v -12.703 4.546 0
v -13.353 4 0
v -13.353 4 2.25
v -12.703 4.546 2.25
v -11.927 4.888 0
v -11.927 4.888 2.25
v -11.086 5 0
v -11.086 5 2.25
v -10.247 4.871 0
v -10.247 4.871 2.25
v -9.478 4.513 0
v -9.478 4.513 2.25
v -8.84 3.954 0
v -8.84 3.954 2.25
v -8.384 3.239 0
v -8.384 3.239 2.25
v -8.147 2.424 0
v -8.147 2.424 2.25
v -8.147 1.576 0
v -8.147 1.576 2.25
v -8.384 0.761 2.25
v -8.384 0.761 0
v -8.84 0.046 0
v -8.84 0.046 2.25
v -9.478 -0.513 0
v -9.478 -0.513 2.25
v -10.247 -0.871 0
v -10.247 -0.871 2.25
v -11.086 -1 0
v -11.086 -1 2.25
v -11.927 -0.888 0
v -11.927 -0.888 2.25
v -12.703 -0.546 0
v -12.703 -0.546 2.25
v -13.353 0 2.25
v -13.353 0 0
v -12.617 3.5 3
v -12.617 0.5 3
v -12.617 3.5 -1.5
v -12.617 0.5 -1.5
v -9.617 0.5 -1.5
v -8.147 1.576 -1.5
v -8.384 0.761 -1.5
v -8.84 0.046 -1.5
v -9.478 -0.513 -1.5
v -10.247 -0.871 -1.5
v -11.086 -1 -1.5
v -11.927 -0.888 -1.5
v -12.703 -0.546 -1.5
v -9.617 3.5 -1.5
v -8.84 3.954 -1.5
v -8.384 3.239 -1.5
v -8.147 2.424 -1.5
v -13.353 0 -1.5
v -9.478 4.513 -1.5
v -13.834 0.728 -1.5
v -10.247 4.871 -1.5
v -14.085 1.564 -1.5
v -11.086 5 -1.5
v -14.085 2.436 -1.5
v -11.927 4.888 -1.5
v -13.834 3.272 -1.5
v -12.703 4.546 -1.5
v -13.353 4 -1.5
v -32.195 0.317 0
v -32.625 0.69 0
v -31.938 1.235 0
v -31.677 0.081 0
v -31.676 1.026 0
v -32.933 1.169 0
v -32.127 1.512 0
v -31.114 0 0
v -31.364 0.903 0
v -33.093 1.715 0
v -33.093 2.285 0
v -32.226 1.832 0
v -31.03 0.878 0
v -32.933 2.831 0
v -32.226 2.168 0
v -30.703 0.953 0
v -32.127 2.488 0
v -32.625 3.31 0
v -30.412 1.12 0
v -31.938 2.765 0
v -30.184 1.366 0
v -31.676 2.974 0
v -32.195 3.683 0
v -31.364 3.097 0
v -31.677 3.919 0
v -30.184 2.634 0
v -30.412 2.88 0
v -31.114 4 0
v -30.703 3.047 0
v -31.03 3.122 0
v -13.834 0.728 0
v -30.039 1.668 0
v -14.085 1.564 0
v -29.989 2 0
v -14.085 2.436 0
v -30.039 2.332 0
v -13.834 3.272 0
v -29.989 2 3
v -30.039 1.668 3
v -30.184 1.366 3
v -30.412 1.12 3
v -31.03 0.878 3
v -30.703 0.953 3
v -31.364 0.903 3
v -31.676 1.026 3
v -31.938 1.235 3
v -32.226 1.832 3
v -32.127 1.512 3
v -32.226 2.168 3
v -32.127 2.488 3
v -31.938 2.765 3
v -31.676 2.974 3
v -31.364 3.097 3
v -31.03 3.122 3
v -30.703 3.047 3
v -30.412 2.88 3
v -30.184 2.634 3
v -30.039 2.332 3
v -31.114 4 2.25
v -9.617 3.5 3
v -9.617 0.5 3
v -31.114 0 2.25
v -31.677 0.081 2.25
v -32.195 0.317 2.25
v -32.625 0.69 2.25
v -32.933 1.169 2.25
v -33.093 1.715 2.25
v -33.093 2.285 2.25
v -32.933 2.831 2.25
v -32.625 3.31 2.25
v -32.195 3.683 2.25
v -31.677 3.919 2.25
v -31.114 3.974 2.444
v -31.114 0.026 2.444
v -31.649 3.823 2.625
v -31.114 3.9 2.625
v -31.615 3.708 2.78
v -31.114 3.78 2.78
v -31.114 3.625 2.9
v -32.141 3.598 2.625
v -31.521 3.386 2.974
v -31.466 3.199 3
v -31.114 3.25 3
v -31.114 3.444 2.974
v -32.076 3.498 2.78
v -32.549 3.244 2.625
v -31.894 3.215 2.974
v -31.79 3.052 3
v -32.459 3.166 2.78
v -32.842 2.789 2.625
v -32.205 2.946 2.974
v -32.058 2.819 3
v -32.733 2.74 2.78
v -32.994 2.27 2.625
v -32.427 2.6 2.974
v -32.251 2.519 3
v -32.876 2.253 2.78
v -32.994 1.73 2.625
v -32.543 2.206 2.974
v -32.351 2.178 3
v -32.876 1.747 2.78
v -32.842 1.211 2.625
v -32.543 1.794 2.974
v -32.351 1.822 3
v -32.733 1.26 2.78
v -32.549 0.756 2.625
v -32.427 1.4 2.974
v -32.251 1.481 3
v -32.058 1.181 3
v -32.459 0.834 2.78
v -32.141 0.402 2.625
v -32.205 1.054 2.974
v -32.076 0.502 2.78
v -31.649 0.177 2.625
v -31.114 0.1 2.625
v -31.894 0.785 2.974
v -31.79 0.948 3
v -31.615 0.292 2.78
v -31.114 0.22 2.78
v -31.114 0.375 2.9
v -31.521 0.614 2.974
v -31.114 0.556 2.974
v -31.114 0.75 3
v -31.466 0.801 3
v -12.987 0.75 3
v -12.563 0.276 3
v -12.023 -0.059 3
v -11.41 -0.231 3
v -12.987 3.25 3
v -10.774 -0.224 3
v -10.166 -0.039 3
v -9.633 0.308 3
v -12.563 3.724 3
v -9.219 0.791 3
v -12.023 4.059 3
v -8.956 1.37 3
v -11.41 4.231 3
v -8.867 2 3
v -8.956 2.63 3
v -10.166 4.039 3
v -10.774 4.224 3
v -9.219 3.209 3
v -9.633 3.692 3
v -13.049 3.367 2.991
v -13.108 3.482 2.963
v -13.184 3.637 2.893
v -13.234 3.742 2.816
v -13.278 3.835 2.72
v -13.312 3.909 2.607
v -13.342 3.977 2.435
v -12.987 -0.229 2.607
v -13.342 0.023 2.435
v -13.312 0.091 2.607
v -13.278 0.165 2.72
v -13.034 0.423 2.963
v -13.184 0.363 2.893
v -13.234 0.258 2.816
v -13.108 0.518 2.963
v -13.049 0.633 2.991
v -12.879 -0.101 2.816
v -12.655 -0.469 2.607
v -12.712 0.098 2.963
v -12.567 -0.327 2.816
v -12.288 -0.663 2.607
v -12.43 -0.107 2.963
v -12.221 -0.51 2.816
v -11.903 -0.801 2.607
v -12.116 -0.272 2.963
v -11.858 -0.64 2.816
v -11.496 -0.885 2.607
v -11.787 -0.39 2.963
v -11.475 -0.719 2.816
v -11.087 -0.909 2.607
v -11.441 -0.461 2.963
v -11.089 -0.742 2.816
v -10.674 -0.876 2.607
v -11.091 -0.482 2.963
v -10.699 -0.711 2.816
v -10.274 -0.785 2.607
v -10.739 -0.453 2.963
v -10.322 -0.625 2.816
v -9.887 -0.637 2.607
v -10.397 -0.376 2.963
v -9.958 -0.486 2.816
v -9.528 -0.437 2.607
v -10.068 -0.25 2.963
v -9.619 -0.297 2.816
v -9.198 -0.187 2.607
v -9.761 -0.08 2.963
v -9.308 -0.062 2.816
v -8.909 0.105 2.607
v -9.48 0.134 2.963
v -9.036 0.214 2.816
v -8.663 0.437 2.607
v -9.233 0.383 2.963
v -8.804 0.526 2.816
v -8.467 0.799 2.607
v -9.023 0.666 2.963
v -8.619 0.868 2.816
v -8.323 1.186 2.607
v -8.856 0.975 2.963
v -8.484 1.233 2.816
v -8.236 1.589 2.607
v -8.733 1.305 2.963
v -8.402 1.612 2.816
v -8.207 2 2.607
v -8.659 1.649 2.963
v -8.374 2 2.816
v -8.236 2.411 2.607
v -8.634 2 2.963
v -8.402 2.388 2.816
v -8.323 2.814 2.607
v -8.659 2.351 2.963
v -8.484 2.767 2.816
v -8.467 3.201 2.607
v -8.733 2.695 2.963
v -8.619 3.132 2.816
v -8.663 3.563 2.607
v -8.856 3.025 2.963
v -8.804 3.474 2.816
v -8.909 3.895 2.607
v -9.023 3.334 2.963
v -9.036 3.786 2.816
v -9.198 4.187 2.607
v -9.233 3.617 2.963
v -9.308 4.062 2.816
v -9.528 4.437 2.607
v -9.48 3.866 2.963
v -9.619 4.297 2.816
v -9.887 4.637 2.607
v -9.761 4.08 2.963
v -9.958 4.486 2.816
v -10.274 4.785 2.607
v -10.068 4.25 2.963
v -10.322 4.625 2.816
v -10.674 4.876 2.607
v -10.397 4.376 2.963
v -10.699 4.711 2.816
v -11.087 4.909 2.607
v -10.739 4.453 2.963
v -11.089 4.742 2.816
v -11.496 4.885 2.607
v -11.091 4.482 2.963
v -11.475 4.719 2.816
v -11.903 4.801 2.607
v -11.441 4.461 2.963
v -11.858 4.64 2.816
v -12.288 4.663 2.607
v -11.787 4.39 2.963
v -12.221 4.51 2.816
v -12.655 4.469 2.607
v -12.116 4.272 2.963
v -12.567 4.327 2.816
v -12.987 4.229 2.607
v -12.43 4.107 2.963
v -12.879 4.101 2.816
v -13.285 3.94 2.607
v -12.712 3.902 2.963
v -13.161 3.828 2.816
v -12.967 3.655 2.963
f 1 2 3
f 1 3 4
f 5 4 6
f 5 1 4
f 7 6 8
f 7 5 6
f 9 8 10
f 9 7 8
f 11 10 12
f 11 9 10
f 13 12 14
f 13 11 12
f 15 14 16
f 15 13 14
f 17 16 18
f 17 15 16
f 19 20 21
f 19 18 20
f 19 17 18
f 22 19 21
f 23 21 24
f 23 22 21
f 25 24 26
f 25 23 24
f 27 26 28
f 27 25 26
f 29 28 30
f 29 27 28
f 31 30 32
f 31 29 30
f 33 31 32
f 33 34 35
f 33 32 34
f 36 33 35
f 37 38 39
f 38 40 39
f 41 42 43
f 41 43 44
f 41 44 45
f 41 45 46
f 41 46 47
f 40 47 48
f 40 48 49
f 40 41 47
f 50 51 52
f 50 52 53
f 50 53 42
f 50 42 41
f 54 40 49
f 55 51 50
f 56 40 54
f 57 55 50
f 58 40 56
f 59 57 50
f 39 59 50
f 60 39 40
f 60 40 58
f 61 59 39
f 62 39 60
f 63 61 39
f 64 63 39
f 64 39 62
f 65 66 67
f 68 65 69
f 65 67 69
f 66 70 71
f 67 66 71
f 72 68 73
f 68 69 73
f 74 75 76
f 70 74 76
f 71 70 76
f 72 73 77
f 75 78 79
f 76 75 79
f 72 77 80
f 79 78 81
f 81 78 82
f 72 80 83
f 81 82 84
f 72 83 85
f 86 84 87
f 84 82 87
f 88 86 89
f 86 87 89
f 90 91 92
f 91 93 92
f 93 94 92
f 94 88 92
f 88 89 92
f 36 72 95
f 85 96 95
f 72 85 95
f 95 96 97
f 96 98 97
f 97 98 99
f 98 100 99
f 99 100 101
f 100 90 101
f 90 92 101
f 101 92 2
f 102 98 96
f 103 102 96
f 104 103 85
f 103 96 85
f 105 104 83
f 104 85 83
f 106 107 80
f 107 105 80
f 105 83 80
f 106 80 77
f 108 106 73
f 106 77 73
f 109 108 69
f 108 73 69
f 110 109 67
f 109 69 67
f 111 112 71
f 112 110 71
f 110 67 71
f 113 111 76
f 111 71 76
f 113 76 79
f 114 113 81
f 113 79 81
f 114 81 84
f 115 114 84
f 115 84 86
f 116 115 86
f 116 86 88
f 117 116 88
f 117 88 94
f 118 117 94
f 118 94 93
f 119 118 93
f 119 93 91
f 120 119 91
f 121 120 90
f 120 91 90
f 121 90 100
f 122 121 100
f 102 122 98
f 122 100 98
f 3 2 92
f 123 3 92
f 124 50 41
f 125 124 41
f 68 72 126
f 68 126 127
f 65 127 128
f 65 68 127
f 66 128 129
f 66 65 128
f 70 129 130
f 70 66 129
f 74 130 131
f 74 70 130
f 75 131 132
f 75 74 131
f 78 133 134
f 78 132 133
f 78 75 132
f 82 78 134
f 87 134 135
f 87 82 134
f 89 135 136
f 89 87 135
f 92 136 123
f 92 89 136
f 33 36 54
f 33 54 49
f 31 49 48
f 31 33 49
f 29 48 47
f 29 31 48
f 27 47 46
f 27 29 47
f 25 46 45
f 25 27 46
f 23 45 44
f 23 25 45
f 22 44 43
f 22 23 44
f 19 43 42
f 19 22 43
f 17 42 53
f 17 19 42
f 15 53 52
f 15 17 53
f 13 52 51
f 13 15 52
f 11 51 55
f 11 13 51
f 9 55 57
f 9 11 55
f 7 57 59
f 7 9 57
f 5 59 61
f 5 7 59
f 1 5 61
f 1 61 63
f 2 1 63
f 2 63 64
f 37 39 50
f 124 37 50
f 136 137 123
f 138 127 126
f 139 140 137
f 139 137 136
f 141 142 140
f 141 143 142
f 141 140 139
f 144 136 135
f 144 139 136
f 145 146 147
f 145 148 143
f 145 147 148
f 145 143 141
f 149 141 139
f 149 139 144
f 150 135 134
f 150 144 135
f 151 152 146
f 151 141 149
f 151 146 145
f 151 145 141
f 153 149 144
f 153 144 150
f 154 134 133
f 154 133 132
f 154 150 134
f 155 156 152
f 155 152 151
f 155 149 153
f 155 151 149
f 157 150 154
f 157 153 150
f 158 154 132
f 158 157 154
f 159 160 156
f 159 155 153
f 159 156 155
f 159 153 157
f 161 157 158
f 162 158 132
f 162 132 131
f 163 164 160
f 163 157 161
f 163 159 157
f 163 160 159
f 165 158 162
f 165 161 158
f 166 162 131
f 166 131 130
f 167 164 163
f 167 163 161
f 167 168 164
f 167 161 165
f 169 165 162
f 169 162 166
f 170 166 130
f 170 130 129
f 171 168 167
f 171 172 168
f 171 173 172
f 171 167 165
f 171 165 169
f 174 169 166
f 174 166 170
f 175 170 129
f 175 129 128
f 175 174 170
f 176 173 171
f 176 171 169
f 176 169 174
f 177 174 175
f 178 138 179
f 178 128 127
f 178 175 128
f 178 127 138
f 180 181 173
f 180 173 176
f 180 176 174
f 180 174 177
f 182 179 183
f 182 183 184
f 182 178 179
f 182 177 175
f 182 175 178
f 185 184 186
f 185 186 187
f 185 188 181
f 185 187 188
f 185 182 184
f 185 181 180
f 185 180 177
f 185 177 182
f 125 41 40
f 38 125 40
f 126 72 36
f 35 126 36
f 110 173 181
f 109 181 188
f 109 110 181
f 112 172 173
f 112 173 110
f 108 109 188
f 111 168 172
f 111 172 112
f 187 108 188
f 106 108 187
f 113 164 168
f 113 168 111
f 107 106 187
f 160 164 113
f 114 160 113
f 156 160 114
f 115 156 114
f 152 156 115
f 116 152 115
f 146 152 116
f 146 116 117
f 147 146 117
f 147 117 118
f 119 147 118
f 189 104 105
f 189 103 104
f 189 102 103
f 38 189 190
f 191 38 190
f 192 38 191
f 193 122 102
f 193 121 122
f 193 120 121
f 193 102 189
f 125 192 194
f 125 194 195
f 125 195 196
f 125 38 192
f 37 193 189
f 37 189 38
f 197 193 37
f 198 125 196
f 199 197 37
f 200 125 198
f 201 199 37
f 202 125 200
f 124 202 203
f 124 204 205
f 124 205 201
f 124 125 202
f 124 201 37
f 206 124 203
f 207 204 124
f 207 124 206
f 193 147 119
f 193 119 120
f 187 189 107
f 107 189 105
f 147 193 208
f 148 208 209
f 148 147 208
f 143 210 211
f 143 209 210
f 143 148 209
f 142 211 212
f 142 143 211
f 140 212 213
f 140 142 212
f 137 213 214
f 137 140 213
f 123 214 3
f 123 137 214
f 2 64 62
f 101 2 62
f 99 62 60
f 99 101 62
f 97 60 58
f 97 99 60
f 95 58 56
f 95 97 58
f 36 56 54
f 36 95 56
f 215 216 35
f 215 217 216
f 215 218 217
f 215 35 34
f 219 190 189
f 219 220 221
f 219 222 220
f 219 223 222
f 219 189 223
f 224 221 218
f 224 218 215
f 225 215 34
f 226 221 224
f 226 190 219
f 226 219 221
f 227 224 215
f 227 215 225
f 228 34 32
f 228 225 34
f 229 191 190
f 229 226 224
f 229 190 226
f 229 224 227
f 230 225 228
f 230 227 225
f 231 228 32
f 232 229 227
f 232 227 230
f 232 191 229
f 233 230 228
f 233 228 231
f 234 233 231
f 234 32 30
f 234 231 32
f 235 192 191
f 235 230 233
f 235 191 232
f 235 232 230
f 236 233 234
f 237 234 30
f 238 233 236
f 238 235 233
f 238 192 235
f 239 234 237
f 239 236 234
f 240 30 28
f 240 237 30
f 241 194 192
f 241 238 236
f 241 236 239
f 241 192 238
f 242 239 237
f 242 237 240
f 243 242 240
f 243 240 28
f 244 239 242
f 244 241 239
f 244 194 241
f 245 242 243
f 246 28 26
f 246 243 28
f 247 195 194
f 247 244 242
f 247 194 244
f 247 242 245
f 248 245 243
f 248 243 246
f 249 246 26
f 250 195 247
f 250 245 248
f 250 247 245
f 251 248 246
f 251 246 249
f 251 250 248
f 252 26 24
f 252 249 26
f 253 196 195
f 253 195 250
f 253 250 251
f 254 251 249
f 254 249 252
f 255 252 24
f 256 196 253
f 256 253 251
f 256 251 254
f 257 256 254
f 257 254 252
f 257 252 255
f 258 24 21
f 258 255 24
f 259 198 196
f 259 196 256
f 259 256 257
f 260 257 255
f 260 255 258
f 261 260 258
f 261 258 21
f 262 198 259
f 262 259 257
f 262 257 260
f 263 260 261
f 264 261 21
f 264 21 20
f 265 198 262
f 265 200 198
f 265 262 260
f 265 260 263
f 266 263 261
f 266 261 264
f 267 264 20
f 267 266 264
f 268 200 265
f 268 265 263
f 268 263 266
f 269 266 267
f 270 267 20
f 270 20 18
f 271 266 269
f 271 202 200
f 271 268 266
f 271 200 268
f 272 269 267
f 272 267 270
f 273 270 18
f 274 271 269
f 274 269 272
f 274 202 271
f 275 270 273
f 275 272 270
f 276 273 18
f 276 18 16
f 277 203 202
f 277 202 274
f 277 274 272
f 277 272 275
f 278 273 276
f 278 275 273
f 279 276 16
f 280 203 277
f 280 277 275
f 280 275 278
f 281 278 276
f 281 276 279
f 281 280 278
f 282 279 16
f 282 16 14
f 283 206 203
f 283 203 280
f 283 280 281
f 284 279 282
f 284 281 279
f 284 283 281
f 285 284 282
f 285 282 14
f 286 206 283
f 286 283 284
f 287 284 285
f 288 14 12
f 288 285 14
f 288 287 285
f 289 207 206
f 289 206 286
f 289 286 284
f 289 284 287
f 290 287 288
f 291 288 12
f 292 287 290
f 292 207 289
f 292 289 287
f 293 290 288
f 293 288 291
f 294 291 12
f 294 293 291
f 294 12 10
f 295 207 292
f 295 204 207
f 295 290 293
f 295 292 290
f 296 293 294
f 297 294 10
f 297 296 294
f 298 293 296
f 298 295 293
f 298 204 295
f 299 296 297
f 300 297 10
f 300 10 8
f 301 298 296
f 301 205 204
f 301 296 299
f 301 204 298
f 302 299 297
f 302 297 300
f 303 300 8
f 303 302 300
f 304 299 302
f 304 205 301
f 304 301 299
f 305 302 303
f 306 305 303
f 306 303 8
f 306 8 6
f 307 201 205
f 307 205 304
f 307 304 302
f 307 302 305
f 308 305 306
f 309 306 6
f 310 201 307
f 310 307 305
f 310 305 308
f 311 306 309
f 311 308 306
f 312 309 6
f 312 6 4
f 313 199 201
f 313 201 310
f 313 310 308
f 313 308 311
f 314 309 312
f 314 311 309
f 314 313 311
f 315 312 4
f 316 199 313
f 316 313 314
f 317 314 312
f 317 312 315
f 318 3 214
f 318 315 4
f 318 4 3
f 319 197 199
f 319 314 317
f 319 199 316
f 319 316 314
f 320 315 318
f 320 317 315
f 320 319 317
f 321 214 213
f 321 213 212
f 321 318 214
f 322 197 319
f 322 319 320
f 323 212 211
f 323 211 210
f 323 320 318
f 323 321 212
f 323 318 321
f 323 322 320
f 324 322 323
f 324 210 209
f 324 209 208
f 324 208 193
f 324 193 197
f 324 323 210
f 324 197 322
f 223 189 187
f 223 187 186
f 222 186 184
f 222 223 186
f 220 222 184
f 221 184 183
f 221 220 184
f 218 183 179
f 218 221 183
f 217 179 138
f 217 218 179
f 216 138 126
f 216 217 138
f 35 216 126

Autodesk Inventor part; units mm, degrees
ref_plane "YZ Plane" through (0, 0, 0) normal (1, 0, 0) x (0, 1, 0)
ref_plane "XZ Plane" through (0, 0, 0) normal (0, 1, 0) x (-1, 0, 0)
ref_plane "XY Plane" through (0, 0, 0) normal (0, 0, 1) x (1, 0, 0)
sketch "Sketch1" plane through (0, 0, 0) normal (0, 0, 1) x (1, 0, 0)
  circle A0 centre (-39.9943, 0) radius 2.25
  arc A1 (-5.0436, -3.25) -> (-5.0436, 3.25) centre (0, 0) ccw
  line L0 (3, 3) -> (3, -3)
  line L1 (3, -3) -> (-3, -3)
  line L2 (-3, -3) -> (-3, 3)
  line L3 (-3, 3) -> (3, 3)
  line L4 (-3, 3) -> (3, 3)
  line L5 (-3, -3) -> (3, -3)
  line L6 (-39.9943, -4) -> (-4.4721, -4)
  line L7 (-4.4721, 4) -> (-39.9943, 4)
  arc A2 (-39.9943, 4) -> (-39.9943, -4) centre (-39.9943, 0) ccw
  point P0 (0, 3)
  point P1 (-19.9972, 0)
extrude "Extrusion1" add sketch "Sketch1" along normal blind 6
sketch "Sketch5" plane through (0, 0, 0) normal (0, 0, -1) x (-1, 0, 0)
  circle A0 centre (0, 0) radius 6
  arc A1 (4.4721, 4) -> (4.4721, -4) centre (0, 0) ccw projected
  line L0 (-3, -3) -> (-3, 3)
  line L1 (-3, 3) -> (3, 3)
  line L2 (3, 3) -> (3, -3)
  line L3 (3, -3) -> (-3, -3)
  point P0 (2.804, -2.804)
  point P1 (5.0436, -3.25)
  point P2 (5.0436, 3.25)
  point P3 (0, -3)
extrude "Extrusion5" add sketch "Sketch5" along normal blind 3
fillet "Fillet2" radius 1.5 4 edges at (-22.2332, -4, 6) (-43.9943, 0, 6) (-22.2332, 4, 6) (6, 0, 6)
scale "Scale1" factors (0.5, 0.5, 0.5) then translate (-11.1166, 2, 0) bodies 1
properties part number "crankshaft"
